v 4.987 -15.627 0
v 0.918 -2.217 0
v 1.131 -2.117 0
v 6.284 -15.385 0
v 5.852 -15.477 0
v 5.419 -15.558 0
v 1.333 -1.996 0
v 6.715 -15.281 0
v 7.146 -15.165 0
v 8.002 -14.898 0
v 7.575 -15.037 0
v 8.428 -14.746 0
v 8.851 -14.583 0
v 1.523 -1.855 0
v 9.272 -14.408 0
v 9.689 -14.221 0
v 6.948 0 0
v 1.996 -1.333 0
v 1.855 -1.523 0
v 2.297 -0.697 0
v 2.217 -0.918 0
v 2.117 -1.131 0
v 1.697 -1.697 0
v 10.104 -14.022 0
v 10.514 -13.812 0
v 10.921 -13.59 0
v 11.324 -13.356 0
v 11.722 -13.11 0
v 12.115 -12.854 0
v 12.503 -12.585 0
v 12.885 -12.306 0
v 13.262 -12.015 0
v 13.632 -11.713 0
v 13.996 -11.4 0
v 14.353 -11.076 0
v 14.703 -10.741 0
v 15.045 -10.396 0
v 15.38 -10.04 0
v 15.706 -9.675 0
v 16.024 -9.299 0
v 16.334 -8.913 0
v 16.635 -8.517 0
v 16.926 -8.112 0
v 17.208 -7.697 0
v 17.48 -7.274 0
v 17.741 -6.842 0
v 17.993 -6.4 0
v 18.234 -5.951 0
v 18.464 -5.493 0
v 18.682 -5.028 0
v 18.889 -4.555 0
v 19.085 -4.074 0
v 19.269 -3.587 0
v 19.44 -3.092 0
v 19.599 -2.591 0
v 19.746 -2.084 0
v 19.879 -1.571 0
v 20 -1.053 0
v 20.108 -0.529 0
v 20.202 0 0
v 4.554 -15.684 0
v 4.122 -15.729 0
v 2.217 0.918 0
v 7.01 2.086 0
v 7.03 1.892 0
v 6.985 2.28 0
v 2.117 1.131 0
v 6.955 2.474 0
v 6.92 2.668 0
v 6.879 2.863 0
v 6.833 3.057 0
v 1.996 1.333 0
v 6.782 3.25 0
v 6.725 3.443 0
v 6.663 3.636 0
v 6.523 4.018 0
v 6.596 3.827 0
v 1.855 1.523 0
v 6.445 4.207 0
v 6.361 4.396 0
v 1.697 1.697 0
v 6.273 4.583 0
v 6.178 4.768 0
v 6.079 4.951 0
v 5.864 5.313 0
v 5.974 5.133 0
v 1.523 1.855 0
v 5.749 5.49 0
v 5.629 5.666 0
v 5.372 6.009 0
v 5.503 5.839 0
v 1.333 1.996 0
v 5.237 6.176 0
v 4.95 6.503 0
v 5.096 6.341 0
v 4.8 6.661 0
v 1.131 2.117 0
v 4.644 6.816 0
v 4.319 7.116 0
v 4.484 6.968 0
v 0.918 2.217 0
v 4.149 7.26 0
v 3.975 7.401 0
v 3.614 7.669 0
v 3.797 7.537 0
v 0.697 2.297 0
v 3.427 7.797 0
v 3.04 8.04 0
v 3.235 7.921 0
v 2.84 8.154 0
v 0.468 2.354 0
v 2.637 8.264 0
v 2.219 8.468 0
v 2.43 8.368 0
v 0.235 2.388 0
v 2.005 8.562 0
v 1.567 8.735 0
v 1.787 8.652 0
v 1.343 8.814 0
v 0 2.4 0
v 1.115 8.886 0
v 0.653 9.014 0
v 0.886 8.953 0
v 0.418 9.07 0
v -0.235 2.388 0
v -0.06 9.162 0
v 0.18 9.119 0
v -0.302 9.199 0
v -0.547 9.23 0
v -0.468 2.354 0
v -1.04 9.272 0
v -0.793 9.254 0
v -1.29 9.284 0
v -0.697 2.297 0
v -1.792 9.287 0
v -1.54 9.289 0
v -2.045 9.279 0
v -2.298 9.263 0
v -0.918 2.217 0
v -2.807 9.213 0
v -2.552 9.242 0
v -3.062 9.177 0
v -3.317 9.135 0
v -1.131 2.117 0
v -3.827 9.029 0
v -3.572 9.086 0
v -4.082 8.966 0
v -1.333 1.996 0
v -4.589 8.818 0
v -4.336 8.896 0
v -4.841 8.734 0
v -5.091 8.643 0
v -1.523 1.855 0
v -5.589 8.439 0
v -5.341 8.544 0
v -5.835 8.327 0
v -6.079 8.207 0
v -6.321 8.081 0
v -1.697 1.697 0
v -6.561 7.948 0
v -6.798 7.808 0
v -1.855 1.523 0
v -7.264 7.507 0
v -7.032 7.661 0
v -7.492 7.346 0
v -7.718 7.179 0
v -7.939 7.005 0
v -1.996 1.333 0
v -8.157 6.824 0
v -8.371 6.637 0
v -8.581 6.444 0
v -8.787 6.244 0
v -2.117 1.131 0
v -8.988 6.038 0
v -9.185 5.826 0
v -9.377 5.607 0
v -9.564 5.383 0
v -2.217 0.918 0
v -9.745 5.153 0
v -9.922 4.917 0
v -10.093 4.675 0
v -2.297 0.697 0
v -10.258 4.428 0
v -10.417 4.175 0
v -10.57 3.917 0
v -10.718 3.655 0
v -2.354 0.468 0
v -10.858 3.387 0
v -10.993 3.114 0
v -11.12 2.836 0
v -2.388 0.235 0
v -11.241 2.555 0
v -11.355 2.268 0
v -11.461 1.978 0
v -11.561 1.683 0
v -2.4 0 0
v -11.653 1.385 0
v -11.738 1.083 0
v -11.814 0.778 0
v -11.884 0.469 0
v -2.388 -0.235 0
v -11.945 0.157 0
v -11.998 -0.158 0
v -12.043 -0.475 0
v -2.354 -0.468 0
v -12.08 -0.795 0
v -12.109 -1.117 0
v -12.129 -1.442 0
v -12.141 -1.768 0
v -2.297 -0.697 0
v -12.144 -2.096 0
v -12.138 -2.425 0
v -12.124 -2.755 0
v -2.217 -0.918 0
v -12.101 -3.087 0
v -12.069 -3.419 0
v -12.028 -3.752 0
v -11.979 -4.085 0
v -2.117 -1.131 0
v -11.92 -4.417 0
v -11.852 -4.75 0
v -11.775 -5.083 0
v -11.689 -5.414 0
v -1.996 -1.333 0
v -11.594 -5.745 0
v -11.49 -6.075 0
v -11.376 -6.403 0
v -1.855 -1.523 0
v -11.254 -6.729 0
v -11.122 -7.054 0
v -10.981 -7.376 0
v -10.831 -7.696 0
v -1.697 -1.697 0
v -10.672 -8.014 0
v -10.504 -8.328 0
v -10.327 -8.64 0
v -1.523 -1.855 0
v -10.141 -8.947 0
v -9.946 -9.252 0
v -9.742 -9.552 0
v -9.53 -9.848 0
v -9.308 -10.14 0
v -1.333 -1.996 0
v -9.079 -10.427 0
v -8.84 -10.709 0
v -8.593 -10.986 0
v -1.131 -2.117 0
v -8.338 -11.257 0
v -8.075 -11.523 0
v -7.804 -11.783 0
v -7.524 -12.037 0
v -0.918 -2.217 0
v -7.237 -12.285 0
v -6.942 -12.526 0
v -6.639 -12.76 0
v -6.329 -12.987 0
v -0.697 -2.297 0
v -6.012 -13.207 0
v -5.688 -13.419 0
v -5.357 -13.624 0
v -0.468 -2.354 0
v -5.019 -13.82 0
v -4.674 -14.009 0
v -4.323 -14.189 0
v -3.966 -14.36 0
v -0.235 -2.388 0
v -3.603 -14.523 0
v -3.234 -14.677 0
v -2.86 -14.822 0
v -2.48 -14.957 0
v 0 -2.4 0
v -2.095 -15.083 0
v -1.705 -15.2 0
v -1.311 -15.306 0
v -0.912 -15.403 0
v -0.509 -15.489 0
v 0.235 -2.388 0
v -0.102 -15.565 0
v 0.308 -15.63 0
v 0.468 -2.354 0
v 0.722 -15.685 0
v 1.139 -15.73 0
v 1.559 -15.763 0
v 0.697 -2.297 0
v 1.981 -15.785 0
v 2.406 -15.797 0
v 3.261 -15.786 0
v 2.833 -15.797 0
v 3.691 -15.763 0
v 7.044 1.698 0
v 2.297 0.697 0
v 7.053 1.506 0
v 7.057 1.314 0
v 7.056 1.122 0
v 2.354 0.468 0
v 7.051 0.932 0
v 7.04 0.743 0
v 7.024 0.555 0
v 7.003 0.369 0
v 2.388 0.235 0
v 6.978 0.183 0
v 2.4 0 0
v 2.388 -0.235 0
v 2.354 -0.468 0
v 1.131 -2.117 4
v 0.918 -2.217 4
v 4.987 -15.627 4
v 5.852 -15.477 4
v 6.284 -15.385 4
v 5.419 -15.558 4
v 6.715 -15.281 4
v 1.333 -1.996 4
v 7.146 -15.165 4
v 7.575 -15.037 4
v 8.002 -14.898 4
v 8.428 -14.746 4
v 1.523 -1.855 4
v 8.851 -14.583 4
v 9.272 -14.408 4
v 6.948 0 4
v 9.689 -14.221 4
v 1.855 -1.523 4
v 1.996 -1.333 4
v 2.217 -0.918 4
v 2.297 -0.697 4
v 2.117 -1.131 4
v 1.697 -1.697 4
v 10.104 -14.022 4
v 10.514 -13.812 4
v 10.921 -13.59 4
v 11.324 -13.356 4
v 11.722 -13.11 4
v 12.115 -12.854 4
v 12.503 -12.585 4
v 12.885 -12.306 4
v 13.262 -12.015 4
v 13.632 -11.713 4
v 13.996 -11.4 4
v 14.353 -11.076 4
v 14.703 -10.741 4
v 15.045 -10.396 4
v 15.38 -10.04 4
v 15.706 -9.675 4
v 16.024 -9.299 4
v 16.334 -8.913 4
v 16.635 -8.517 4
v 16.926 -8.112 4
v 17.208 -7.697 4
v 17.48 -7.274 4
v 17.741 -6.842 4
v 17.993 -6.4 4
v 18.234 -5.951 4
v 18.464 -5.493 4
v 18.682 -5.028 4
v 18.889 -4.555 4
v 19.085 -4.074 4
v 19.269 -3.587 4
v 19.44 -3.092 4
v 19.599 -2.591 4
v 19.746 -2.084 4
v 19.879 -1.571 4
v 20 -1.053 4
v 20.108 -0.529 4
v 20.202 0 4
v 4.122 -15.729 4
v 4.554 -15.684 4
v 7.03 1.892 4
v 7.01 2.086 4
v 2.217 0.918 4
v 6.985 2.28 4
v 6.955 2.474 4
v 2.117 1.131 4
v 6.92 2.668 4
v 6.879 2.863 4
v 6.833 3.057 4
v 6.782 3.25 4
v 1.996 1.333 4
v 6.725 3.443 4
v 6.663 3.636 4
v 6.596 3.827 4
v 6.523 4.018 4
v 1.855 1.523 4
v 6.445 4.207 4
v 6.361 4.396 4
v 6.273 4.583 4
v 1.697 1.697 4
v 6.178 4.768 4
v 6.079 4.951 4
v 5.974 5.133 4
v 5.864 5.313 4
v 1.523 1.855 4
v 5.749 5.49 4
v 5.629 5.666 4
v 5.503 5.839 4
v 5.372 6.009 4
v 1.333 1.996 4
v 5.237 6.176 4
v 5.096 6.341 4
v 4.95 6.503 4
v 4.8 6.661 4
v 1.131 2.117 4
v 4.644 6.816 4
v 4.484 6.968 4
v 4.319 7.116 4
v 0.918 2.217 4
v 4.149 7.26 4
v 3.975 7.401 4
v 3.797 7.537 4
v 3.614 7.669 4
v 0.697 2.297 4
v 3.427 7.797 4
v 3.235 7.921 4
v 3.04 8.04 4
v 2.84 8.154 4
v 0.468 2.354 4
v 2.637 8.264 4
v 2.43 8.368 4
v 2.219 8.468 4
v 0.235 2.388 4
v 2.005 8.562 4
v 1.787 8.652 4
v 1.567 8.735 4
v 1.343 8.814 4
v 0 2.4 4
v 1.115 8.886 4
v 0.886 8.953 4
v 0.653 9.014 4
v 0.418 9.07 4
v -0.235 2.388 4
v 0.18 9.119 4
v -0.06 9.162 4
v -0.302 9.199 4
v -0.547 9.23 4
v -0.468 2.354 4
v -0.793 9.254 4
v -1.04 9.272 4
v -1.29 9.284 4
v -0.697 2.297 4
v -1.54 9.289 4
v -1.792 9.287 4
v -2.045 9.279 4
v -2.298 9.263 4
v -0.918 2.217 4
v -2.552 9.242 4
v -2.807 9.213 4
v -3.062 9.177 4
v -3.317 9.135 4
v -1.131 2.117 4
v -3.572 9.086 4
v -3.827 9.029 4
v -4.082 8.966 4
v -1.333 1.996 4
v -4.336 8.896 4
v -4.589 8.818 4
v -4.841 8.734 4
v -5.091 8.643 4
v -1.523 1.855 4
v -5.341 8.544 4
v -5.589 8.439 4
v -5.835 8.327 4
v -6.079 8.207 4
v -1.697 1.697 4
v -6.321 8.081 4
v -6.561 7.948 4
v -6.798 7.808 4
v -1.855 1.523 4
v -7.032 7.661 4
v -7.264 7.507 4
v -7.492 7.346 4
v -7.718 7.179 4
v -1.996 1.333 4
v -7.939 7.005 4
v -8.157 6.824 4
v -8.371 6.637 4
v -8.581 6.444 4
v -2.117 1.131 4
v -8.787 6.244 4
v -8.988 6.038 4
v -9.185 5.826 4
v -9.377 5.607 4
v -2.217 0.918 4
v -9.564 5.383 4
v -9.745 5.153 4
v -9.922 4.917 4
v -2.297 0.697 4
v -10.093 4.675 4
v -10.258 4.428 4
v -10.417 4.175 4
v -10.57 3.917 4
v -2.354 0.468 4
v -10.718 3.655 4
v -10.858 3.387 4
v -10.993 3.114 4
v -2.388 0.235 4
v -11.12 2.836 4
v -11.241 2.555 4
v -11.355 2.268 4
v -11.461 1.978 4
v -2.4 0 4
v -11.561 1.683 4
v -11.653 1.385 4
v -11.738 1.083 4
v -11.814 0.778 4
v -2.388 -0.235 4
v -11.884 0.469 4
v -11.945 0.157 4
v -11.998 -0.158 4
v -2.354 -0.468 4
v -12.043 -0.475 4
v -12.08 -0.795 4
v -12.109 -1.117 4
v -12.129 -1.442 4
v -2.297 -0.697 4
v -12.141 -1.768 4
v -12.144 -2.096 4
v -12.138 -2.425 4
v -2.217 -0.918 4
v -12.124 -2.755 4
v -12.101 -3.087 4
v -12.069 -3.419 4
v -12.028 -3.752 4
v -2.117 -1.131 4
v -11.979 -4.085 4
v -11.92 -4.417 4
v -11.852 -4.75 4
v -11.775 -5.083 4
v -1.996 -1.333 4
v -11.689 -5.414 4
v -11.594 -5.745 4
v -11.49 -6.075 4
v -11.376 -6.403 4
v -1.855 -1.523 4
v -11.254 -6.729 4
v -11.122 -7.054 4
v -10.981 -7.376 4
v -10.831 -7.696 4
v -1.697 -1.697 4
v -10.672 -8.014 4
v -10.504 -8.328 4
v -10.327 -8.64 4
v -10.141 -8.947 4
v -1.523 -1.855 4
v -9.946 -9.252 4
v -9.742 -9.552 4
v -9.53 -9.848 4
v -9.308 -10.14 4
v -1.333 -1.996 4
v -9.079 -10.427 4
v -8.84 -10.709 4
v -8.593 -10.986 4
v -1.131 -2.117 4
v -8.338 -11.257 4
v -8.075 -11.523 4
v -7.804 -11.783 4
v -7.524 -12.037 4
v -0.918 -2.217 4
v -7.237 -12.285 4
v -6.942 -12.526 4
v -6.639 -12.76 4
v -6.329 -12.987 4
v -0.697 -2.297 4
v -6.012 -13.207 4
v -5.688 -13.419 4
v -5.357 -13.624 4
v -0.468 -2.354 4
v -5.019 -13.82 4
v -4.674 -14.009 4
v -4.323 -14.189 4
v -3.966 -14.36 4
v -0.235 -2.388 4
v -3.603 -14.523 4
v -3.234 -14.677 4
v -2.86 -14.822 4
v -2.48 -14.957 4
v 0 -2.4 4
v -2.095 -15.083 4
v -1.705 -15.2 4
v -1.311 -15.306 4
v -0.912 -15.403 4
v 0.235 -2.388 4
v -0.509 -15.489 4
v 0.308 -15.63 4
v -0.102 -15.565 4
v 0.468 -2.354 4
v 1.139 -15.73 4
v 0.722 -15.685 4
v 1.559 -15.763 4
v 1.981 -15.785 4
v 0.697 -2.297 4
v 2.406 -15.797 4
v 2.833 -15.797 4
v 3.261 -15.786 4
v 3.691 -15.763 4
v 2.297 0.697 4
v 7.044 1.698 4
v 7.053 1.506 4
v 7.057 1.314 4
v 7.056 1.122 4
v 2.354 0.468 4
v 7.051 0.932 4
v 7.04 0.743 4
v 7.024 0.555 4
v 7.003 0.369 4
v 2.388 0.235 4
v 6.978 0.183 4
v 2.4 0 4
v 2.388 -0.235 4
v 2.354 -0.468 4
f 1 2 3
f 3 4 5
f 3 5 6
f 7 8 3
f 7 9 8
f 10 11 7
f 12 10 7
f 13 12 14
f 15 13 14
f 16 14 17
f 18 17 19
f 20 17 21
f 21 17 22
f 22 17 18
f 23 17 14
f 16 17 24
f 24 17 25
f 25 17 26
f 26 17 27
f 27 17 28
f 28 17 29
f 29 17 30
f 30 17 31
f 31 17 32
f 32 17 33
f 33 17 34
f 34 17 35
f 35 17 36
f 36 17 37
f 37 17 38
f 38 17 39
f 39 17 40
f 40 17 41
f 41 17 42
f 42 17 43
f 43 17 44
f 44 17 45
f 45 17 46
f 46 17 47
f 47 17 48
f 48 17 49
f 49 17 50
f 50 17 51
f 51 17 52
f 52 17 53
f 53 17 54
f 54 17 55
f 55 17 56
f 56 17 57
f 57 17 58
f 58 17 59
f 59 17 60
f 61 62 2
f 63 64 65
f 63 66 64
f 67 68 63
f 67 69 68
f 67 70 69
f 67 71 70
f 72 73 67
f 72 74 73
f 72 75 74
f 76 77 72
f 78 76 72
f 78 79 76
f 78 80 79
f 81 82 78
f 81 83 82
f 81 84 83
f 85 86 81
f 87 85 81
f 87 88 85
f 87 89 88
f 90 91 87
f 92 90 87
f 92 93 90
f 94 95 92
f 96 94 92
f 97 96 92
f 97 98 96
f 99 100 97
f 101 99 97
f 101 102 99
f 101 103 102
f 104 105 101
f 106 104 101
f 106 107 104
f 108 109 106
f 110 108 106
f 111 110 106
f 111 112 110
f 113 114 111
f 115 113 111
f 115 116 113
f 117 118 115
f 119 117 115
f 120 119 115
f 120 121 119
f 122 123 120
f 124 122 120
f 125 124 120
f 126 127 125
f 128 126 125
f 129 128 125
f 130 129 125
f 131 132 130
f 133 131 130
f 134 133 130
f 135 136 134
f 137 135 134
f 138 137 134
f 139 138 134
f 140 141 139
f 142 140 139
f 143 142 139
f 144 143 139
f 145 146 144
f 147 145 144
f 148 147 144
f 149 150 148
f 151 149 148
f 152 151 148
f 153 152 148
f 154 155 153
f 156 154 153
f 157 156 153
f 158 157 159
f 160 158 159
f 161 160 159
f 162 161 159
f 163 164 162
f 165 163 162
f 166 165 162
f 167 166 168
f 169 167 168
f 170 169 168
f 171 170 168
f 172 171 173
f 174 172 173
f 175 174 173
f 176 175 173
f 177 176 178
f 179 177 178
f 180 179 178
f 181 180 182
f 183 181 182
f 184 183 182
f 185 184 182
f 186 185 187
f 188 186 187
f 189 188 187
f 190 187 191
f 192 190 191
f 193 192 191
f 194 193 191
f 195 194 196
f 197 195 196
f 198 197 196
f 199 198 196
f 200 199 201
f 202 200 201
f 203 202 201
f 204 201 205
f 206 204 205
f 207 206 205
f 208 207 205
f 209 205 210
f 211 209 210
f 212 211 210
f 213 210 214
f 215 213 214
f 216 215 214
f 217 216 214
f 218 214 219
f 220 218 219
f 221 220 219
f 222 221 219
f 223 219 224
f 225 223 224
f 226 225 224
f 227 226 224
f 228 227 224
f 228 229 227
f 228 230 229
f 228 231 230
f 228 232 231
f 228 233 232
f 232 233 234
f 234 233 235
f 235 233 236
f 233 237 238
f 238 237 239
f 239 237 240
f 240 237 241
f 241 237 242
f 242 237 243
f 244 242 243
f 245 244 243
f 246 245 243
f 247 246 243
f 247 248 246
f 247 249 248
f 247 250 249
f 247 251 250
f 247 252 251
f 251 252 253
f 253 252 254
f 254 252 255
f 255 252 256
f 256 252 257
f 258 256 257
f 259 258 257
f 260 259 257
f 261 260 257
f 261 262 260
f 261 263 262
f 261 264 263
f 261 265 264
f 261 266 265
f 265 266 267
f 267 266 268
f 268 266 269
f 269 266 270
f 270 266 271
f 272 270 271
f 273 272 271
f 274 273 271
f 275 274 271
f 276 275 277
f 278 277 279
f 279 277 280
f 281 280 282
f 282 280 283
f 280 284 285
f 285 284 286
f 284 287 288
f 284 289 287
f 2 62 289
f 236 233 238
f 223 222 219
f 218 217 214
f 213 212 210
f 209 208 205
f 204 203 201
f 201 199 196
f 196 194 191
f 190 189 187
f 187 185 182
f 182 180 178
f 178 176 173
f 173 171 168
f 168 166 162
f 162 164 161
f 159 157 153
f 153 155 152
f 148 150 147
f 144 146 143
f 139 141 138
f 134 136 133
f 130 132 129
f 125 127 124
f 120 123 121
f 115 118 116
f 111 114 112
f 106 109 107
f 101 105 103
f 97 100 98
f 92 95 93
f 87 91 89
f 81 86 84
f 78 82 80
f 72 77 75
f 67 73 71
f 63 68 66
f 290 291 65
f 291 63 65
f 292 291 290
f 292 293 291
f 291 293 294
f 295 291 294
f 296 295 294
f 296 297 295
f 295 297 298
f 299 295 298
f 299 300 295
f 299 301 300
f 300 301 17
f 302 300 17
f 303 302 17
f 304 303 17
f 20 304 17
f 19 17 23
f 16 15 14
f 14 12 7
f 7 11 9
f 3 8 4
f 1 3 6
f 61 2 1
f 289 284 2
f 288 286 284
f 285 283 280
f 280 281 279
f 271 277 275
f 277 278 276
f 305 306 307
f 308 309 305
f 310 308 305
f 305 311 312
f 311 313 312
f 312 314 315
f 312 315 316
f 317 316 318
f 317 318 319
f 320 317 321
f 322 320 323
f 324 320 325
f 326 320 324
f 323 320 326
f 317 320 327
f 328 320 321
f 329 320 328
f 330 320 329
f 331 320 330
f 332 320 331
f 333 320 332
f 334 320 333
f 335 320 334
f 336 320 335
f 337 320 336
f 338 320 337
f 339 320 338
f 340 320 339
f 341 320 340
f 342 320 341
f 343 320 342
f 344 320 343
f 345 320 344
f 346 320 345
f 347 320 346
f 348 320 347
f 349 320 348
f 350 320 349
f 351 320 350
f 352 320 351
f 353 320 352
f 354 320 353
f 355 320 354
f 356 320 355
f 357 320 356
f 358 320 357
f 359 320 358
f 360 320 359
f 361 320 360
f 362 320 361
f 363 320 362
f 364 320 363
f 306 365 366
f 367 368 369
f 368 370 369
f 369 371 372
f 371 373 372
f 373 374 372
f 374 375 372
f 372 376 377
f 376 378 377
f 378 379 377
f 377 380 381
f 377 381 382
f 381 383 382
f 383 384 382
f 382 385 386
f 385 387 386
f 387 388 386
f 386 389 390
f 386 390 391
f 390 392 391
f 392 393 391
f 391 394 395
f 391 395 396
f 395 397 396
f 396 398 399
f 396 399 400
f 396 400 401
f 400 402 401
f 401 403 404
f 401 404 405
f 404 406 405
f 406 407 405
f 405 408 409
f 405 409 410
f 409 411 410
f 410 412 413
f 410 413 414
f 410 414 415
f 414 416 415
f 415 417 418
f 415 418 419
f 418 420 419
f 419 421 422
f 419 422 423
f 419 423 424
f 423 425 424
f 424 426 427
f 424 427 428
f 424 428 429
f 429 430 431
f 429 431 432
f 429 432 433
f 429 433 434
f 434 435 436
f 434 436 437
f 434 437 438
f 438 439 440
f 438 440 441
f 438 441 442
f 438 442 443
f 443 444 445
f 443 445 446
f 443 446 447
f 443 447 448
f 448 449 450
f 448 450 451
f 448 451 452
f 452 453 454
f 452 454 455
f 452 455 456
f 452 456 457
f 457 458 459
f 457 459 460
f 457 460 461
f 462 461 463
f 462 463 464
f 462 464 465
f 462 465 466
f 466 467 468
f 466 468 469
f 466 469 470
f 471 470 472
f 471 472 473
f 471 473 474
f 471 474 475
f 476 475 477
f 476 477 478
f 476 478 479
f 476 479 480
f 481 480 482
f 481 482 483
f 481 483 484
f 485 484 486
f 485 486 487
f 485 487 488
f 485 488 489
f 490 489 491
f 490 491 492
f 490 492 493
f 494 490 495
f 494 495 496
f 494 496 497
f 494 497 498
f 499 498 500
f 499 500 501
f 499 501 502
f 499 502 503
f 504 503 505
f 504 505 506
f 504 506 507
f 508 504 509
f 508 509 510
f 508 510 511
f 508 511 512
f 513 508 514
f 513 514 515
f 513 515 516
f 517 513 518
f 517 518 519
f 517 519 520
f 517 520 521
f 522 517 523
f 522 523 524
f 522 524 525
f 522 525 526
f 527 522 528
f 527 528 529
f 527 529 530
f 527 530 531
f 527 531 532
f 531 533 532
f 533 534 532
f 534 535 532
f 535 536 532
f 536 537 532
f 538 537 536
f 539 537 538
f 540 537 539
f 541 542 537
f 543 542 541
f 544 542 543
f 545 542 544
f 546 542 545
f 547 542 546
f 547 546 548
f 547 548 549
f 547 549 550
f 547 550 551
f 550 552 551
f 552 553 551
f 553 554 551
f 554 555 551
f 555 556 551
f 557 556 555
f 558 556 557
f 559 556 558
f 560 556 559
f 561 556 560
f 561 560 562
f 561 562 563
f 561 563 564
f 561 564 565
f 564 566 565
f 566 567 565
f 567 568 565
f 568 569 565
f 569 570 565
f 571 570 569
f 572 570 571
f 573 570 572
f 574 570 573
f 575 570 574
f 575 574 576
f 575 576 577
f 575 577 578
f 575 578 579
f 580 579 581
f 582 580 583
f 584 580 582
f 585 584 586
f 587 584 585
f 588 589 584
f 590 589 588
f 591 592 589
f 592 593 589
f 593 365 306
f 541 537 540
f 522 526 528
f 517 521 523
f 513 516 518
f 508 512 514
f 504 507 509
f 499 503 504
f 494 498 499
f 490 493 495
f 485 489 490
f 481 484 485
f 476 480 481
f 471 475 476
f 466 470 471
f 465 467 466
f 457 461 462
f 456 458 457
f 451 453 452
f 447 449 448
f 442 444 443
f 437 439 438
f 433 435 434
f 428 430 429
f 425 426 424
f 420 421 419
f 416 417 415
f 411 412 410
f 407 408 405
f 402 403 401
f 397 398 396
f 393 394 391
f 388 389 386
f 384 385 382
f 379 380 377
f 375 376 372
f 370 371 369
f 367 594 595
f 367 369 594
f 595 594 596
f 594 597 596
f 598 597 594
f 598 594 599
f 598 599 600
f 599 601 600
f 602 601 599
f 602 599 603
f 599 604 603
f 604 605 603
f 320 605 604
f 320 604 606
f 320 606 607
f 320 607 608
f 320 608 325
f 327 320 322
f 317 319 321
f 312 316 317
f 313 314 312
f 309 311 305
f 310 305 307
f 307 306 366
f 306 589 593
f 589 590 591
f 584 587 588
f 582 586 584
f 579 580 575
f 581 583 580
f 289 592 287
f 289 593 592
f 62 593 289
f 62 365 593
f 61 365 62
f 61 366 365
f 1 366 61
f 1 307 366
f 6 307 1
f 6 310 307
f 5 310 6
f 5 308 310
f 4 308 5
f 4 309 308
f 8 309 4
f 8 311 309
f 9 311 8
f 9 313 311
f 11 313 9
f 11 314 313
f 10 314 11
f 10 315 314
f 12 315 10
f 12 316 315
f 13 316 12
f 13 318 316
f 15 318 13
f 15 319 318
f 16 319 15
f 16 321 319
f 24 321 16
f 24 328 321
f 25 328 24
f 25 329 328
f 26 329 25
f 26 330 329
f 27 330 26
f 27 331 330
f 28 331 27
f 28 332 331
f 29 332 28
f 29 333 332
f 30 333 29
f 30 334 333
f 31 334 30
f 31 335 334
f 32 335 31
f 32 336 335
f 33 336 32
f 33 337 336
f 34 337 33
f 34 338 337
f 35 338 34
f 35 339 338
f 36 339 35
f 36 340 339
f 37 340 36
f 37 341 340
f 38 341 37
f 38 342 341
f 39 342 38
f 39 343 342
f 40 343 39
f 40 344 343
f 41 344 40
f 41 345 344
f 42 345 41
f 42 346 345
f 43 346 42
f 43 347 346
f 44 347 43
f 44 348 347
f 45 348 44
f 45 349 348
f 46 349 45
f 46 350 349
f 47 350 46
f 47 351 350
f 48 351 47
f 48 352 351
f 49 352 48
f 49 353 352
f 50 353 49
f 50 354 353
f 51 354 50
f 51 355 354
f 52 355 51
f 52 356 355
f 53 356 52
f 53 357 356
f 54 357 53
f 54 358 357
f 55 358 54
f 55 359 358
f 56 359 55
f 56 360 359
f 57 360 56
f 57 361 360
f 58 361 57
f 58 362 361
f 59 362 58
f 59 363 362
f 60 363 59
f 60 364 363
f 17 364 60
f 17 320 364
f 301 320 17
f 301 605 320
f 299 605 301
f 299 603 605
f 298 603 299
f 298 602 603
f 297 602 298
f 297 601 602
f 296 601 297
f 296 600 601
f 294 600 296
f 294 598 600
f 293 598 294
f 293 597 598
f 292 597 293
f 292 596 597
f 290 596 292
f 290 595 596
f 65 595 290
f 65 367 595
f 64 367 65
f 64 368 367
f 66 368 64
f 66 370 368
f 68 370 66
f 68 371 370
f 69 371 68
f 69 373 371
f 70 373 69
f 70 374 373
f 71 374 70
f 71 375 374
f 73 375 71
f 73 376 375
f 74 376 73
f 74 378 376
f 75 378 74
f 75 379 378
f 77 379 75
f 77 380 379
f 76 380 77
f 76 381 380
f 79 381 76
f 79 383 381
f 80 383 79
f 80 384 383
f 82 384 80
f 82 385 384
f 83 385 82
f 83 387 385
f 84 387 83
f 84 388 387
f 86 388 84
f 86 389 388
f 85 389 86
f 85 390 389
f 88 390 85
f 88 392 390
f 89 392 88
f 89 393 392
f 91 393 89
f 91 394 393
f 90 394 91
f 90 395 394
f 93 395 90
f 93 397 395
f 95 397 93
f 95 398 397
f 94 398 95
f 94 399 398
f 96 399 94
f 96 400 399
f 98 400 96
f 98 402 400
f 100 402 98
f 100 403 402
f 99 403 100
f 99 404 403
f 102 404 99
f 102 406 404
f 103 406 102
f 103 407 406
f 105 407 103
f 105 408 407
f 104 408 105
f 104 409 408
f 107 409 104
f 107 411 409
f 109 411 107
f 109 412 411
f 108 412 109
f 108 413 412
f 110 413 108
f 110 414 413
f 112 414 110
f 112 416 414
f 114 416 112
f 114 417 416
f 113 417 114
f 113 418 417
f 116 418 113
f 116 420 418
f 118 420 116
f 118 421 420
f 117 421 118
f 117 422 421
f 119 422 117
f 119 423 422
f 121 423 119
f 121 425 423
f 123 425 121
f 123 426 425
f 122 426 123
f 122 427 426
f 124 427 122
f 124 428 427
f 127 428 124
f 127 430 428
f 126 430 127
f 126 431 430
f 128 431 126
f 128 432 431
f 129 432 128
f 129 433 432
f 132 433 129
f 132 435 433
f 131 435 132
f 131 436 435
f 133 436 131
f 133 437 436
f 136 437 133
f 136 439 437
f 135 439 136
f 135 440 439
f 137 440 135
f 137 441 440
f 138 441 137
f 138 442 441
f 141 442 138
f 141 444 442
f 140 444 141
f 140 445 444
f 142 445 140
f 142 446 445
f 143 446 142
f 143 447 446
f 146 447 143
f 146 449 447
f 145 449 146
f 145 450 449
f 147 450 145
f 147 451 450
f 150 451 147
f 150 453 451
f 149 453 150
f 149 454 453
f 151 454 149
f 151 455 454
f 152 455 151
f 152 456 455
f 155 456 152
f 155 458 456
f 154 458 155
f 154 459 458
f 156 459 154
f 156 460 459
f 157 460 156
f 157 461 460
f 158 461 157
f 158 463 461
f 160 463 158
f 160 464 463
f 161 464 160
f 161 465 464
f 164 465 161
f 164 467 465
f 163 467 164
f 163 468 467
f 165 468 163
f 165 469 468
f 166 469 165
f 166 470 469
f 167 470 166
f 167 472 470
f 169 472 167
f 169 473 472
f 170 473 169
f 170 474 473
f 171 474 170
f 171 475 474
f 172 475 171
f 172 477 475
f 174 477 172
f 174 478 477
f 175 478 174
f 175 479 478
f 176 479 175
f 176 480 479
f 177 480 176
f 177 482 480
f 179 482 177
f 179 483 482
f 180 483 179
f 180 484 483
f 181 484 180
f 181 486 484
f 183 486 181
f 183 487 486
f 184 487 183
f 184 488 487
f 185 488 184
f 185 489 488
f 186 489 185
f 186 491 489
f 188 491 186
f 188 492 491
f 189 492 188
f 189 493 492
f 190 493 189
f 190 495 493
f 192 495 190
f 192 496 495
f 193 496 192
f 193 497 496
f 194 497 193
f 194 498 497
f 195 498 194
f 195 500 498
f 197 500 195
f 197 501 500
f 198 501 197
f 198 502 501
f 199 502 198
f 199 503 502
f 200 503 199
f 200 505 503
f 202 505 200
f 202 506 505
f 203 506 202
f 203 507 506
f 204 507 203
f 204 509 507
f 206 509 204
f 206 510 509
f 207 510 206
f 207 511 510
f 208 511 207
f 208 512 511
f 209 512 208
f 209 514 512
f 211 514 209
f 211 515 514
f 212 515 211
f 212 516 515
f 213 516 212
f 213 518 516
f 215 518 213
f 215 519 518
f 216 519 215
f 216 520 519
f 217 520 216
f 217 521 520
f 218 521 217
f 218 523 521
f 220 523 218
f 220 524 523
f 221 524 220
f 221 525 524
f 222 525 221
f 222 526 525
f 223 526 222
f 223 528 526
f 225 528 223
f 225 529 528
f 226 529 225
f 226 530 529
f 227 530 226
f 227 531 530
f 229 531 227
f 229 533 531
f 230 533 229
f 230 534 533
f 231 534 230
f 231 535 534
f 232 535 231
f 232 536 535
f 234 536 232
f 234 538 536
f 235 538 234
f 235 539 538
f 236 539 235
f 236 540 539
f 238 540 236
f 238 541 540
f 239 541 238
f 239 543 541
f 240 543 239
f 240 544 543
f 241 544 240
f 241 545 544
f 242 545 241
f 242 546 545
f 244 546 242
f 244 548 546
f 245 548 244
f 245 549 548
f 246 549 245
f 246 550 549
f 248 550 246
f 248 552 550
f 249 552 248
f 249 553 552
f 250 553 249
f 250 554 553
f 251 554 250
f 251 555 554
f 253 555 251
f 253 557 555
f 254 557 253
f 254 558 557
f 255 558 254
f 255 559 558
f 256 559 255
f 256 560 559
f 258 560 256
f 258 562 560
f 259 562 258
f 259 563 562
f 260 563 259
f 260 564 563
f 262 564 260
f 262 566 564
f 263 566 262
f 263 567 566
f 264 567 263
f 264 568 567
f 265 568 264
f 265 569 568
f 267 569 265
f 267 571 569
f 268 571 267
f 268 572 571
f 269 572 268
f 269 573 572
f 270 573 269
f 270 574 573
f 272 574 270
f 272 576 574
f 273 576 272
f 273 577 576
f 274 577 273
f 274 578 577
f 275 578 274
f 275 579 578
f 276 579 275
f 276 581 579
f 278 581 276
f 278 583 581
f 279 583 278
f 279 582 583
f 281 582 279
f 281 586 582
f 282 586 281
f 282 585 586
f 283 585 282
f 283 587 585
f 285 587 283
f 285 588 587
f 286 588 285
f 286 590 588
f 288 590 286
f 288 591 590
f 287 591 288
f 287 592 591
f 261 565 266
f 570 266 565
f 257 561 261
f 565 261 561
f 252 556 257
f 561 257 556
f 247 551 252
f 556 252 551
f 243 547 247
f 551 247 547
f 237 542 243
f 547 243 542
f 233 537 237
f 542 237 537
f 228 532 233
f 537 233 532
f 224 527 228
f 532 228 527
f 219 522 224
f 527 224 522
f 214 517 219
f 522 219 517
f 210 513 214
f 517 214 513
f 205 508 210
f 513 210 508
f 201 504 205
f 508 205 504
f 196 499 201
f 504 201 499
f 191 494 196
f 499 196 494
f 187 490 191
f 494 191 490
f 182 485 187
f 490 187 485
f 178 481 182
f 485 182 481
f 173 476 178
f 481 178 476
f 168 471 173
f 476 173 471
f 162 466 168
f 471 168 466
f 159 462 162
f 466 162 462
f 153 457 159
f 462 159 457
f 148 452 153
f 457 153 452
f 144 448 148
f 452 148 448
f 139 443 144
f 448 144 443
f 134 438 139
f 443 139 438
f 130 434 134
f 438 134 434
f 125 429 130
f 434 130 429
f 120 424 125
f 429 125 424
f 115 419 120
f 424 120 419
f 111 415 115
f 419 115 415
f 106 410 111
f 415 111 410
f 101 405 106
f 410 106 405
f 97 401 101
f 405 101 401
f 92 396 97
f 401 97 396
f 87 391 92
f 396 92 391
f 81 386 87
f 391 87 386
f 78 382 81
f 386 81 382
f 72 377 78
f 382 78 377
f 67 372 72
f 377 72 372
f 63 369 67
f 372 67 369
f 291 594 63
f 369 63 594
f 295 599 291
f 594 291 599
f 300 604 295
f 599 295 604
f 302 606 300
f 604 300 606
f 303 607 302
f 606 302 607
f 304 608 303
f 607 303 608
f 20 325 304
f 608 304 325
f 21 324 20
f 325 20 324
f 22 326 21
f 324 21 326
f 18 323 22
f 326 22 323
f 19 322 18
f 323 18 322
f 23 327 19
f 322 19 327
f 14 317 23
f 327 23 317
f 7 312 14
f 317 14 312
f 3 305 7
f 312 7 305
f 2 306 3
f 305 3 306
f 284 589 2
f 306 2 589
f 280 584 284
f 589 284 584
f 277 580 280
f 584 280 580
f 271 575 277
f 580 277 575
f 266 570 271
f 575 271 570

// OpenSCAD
/***
 * @function logarithmic_spiral_curve_gear_body
 * @brief Render the Logarithmic spiral body before tooth placement.
 * Source: [`functions/logarithmic_spiral/curve_gear_logarithmic_spiral_body.scad`](functions/logarithmic_spiral/curve_gear_logarithmic_spiral_body.scad)
 * @image ../images/functions/logarithmic_spiral/curve_gear_logarithmic_spiral_body.png curve_gear_logarithmic_spiral_body example preview
 * @image ../utils/doxydown-support/table-spacer.png ⠀
 */
use <curve_gear_logarithmic_spiral.scad>;
_main_example_logarithmic_spiral_view("body");
